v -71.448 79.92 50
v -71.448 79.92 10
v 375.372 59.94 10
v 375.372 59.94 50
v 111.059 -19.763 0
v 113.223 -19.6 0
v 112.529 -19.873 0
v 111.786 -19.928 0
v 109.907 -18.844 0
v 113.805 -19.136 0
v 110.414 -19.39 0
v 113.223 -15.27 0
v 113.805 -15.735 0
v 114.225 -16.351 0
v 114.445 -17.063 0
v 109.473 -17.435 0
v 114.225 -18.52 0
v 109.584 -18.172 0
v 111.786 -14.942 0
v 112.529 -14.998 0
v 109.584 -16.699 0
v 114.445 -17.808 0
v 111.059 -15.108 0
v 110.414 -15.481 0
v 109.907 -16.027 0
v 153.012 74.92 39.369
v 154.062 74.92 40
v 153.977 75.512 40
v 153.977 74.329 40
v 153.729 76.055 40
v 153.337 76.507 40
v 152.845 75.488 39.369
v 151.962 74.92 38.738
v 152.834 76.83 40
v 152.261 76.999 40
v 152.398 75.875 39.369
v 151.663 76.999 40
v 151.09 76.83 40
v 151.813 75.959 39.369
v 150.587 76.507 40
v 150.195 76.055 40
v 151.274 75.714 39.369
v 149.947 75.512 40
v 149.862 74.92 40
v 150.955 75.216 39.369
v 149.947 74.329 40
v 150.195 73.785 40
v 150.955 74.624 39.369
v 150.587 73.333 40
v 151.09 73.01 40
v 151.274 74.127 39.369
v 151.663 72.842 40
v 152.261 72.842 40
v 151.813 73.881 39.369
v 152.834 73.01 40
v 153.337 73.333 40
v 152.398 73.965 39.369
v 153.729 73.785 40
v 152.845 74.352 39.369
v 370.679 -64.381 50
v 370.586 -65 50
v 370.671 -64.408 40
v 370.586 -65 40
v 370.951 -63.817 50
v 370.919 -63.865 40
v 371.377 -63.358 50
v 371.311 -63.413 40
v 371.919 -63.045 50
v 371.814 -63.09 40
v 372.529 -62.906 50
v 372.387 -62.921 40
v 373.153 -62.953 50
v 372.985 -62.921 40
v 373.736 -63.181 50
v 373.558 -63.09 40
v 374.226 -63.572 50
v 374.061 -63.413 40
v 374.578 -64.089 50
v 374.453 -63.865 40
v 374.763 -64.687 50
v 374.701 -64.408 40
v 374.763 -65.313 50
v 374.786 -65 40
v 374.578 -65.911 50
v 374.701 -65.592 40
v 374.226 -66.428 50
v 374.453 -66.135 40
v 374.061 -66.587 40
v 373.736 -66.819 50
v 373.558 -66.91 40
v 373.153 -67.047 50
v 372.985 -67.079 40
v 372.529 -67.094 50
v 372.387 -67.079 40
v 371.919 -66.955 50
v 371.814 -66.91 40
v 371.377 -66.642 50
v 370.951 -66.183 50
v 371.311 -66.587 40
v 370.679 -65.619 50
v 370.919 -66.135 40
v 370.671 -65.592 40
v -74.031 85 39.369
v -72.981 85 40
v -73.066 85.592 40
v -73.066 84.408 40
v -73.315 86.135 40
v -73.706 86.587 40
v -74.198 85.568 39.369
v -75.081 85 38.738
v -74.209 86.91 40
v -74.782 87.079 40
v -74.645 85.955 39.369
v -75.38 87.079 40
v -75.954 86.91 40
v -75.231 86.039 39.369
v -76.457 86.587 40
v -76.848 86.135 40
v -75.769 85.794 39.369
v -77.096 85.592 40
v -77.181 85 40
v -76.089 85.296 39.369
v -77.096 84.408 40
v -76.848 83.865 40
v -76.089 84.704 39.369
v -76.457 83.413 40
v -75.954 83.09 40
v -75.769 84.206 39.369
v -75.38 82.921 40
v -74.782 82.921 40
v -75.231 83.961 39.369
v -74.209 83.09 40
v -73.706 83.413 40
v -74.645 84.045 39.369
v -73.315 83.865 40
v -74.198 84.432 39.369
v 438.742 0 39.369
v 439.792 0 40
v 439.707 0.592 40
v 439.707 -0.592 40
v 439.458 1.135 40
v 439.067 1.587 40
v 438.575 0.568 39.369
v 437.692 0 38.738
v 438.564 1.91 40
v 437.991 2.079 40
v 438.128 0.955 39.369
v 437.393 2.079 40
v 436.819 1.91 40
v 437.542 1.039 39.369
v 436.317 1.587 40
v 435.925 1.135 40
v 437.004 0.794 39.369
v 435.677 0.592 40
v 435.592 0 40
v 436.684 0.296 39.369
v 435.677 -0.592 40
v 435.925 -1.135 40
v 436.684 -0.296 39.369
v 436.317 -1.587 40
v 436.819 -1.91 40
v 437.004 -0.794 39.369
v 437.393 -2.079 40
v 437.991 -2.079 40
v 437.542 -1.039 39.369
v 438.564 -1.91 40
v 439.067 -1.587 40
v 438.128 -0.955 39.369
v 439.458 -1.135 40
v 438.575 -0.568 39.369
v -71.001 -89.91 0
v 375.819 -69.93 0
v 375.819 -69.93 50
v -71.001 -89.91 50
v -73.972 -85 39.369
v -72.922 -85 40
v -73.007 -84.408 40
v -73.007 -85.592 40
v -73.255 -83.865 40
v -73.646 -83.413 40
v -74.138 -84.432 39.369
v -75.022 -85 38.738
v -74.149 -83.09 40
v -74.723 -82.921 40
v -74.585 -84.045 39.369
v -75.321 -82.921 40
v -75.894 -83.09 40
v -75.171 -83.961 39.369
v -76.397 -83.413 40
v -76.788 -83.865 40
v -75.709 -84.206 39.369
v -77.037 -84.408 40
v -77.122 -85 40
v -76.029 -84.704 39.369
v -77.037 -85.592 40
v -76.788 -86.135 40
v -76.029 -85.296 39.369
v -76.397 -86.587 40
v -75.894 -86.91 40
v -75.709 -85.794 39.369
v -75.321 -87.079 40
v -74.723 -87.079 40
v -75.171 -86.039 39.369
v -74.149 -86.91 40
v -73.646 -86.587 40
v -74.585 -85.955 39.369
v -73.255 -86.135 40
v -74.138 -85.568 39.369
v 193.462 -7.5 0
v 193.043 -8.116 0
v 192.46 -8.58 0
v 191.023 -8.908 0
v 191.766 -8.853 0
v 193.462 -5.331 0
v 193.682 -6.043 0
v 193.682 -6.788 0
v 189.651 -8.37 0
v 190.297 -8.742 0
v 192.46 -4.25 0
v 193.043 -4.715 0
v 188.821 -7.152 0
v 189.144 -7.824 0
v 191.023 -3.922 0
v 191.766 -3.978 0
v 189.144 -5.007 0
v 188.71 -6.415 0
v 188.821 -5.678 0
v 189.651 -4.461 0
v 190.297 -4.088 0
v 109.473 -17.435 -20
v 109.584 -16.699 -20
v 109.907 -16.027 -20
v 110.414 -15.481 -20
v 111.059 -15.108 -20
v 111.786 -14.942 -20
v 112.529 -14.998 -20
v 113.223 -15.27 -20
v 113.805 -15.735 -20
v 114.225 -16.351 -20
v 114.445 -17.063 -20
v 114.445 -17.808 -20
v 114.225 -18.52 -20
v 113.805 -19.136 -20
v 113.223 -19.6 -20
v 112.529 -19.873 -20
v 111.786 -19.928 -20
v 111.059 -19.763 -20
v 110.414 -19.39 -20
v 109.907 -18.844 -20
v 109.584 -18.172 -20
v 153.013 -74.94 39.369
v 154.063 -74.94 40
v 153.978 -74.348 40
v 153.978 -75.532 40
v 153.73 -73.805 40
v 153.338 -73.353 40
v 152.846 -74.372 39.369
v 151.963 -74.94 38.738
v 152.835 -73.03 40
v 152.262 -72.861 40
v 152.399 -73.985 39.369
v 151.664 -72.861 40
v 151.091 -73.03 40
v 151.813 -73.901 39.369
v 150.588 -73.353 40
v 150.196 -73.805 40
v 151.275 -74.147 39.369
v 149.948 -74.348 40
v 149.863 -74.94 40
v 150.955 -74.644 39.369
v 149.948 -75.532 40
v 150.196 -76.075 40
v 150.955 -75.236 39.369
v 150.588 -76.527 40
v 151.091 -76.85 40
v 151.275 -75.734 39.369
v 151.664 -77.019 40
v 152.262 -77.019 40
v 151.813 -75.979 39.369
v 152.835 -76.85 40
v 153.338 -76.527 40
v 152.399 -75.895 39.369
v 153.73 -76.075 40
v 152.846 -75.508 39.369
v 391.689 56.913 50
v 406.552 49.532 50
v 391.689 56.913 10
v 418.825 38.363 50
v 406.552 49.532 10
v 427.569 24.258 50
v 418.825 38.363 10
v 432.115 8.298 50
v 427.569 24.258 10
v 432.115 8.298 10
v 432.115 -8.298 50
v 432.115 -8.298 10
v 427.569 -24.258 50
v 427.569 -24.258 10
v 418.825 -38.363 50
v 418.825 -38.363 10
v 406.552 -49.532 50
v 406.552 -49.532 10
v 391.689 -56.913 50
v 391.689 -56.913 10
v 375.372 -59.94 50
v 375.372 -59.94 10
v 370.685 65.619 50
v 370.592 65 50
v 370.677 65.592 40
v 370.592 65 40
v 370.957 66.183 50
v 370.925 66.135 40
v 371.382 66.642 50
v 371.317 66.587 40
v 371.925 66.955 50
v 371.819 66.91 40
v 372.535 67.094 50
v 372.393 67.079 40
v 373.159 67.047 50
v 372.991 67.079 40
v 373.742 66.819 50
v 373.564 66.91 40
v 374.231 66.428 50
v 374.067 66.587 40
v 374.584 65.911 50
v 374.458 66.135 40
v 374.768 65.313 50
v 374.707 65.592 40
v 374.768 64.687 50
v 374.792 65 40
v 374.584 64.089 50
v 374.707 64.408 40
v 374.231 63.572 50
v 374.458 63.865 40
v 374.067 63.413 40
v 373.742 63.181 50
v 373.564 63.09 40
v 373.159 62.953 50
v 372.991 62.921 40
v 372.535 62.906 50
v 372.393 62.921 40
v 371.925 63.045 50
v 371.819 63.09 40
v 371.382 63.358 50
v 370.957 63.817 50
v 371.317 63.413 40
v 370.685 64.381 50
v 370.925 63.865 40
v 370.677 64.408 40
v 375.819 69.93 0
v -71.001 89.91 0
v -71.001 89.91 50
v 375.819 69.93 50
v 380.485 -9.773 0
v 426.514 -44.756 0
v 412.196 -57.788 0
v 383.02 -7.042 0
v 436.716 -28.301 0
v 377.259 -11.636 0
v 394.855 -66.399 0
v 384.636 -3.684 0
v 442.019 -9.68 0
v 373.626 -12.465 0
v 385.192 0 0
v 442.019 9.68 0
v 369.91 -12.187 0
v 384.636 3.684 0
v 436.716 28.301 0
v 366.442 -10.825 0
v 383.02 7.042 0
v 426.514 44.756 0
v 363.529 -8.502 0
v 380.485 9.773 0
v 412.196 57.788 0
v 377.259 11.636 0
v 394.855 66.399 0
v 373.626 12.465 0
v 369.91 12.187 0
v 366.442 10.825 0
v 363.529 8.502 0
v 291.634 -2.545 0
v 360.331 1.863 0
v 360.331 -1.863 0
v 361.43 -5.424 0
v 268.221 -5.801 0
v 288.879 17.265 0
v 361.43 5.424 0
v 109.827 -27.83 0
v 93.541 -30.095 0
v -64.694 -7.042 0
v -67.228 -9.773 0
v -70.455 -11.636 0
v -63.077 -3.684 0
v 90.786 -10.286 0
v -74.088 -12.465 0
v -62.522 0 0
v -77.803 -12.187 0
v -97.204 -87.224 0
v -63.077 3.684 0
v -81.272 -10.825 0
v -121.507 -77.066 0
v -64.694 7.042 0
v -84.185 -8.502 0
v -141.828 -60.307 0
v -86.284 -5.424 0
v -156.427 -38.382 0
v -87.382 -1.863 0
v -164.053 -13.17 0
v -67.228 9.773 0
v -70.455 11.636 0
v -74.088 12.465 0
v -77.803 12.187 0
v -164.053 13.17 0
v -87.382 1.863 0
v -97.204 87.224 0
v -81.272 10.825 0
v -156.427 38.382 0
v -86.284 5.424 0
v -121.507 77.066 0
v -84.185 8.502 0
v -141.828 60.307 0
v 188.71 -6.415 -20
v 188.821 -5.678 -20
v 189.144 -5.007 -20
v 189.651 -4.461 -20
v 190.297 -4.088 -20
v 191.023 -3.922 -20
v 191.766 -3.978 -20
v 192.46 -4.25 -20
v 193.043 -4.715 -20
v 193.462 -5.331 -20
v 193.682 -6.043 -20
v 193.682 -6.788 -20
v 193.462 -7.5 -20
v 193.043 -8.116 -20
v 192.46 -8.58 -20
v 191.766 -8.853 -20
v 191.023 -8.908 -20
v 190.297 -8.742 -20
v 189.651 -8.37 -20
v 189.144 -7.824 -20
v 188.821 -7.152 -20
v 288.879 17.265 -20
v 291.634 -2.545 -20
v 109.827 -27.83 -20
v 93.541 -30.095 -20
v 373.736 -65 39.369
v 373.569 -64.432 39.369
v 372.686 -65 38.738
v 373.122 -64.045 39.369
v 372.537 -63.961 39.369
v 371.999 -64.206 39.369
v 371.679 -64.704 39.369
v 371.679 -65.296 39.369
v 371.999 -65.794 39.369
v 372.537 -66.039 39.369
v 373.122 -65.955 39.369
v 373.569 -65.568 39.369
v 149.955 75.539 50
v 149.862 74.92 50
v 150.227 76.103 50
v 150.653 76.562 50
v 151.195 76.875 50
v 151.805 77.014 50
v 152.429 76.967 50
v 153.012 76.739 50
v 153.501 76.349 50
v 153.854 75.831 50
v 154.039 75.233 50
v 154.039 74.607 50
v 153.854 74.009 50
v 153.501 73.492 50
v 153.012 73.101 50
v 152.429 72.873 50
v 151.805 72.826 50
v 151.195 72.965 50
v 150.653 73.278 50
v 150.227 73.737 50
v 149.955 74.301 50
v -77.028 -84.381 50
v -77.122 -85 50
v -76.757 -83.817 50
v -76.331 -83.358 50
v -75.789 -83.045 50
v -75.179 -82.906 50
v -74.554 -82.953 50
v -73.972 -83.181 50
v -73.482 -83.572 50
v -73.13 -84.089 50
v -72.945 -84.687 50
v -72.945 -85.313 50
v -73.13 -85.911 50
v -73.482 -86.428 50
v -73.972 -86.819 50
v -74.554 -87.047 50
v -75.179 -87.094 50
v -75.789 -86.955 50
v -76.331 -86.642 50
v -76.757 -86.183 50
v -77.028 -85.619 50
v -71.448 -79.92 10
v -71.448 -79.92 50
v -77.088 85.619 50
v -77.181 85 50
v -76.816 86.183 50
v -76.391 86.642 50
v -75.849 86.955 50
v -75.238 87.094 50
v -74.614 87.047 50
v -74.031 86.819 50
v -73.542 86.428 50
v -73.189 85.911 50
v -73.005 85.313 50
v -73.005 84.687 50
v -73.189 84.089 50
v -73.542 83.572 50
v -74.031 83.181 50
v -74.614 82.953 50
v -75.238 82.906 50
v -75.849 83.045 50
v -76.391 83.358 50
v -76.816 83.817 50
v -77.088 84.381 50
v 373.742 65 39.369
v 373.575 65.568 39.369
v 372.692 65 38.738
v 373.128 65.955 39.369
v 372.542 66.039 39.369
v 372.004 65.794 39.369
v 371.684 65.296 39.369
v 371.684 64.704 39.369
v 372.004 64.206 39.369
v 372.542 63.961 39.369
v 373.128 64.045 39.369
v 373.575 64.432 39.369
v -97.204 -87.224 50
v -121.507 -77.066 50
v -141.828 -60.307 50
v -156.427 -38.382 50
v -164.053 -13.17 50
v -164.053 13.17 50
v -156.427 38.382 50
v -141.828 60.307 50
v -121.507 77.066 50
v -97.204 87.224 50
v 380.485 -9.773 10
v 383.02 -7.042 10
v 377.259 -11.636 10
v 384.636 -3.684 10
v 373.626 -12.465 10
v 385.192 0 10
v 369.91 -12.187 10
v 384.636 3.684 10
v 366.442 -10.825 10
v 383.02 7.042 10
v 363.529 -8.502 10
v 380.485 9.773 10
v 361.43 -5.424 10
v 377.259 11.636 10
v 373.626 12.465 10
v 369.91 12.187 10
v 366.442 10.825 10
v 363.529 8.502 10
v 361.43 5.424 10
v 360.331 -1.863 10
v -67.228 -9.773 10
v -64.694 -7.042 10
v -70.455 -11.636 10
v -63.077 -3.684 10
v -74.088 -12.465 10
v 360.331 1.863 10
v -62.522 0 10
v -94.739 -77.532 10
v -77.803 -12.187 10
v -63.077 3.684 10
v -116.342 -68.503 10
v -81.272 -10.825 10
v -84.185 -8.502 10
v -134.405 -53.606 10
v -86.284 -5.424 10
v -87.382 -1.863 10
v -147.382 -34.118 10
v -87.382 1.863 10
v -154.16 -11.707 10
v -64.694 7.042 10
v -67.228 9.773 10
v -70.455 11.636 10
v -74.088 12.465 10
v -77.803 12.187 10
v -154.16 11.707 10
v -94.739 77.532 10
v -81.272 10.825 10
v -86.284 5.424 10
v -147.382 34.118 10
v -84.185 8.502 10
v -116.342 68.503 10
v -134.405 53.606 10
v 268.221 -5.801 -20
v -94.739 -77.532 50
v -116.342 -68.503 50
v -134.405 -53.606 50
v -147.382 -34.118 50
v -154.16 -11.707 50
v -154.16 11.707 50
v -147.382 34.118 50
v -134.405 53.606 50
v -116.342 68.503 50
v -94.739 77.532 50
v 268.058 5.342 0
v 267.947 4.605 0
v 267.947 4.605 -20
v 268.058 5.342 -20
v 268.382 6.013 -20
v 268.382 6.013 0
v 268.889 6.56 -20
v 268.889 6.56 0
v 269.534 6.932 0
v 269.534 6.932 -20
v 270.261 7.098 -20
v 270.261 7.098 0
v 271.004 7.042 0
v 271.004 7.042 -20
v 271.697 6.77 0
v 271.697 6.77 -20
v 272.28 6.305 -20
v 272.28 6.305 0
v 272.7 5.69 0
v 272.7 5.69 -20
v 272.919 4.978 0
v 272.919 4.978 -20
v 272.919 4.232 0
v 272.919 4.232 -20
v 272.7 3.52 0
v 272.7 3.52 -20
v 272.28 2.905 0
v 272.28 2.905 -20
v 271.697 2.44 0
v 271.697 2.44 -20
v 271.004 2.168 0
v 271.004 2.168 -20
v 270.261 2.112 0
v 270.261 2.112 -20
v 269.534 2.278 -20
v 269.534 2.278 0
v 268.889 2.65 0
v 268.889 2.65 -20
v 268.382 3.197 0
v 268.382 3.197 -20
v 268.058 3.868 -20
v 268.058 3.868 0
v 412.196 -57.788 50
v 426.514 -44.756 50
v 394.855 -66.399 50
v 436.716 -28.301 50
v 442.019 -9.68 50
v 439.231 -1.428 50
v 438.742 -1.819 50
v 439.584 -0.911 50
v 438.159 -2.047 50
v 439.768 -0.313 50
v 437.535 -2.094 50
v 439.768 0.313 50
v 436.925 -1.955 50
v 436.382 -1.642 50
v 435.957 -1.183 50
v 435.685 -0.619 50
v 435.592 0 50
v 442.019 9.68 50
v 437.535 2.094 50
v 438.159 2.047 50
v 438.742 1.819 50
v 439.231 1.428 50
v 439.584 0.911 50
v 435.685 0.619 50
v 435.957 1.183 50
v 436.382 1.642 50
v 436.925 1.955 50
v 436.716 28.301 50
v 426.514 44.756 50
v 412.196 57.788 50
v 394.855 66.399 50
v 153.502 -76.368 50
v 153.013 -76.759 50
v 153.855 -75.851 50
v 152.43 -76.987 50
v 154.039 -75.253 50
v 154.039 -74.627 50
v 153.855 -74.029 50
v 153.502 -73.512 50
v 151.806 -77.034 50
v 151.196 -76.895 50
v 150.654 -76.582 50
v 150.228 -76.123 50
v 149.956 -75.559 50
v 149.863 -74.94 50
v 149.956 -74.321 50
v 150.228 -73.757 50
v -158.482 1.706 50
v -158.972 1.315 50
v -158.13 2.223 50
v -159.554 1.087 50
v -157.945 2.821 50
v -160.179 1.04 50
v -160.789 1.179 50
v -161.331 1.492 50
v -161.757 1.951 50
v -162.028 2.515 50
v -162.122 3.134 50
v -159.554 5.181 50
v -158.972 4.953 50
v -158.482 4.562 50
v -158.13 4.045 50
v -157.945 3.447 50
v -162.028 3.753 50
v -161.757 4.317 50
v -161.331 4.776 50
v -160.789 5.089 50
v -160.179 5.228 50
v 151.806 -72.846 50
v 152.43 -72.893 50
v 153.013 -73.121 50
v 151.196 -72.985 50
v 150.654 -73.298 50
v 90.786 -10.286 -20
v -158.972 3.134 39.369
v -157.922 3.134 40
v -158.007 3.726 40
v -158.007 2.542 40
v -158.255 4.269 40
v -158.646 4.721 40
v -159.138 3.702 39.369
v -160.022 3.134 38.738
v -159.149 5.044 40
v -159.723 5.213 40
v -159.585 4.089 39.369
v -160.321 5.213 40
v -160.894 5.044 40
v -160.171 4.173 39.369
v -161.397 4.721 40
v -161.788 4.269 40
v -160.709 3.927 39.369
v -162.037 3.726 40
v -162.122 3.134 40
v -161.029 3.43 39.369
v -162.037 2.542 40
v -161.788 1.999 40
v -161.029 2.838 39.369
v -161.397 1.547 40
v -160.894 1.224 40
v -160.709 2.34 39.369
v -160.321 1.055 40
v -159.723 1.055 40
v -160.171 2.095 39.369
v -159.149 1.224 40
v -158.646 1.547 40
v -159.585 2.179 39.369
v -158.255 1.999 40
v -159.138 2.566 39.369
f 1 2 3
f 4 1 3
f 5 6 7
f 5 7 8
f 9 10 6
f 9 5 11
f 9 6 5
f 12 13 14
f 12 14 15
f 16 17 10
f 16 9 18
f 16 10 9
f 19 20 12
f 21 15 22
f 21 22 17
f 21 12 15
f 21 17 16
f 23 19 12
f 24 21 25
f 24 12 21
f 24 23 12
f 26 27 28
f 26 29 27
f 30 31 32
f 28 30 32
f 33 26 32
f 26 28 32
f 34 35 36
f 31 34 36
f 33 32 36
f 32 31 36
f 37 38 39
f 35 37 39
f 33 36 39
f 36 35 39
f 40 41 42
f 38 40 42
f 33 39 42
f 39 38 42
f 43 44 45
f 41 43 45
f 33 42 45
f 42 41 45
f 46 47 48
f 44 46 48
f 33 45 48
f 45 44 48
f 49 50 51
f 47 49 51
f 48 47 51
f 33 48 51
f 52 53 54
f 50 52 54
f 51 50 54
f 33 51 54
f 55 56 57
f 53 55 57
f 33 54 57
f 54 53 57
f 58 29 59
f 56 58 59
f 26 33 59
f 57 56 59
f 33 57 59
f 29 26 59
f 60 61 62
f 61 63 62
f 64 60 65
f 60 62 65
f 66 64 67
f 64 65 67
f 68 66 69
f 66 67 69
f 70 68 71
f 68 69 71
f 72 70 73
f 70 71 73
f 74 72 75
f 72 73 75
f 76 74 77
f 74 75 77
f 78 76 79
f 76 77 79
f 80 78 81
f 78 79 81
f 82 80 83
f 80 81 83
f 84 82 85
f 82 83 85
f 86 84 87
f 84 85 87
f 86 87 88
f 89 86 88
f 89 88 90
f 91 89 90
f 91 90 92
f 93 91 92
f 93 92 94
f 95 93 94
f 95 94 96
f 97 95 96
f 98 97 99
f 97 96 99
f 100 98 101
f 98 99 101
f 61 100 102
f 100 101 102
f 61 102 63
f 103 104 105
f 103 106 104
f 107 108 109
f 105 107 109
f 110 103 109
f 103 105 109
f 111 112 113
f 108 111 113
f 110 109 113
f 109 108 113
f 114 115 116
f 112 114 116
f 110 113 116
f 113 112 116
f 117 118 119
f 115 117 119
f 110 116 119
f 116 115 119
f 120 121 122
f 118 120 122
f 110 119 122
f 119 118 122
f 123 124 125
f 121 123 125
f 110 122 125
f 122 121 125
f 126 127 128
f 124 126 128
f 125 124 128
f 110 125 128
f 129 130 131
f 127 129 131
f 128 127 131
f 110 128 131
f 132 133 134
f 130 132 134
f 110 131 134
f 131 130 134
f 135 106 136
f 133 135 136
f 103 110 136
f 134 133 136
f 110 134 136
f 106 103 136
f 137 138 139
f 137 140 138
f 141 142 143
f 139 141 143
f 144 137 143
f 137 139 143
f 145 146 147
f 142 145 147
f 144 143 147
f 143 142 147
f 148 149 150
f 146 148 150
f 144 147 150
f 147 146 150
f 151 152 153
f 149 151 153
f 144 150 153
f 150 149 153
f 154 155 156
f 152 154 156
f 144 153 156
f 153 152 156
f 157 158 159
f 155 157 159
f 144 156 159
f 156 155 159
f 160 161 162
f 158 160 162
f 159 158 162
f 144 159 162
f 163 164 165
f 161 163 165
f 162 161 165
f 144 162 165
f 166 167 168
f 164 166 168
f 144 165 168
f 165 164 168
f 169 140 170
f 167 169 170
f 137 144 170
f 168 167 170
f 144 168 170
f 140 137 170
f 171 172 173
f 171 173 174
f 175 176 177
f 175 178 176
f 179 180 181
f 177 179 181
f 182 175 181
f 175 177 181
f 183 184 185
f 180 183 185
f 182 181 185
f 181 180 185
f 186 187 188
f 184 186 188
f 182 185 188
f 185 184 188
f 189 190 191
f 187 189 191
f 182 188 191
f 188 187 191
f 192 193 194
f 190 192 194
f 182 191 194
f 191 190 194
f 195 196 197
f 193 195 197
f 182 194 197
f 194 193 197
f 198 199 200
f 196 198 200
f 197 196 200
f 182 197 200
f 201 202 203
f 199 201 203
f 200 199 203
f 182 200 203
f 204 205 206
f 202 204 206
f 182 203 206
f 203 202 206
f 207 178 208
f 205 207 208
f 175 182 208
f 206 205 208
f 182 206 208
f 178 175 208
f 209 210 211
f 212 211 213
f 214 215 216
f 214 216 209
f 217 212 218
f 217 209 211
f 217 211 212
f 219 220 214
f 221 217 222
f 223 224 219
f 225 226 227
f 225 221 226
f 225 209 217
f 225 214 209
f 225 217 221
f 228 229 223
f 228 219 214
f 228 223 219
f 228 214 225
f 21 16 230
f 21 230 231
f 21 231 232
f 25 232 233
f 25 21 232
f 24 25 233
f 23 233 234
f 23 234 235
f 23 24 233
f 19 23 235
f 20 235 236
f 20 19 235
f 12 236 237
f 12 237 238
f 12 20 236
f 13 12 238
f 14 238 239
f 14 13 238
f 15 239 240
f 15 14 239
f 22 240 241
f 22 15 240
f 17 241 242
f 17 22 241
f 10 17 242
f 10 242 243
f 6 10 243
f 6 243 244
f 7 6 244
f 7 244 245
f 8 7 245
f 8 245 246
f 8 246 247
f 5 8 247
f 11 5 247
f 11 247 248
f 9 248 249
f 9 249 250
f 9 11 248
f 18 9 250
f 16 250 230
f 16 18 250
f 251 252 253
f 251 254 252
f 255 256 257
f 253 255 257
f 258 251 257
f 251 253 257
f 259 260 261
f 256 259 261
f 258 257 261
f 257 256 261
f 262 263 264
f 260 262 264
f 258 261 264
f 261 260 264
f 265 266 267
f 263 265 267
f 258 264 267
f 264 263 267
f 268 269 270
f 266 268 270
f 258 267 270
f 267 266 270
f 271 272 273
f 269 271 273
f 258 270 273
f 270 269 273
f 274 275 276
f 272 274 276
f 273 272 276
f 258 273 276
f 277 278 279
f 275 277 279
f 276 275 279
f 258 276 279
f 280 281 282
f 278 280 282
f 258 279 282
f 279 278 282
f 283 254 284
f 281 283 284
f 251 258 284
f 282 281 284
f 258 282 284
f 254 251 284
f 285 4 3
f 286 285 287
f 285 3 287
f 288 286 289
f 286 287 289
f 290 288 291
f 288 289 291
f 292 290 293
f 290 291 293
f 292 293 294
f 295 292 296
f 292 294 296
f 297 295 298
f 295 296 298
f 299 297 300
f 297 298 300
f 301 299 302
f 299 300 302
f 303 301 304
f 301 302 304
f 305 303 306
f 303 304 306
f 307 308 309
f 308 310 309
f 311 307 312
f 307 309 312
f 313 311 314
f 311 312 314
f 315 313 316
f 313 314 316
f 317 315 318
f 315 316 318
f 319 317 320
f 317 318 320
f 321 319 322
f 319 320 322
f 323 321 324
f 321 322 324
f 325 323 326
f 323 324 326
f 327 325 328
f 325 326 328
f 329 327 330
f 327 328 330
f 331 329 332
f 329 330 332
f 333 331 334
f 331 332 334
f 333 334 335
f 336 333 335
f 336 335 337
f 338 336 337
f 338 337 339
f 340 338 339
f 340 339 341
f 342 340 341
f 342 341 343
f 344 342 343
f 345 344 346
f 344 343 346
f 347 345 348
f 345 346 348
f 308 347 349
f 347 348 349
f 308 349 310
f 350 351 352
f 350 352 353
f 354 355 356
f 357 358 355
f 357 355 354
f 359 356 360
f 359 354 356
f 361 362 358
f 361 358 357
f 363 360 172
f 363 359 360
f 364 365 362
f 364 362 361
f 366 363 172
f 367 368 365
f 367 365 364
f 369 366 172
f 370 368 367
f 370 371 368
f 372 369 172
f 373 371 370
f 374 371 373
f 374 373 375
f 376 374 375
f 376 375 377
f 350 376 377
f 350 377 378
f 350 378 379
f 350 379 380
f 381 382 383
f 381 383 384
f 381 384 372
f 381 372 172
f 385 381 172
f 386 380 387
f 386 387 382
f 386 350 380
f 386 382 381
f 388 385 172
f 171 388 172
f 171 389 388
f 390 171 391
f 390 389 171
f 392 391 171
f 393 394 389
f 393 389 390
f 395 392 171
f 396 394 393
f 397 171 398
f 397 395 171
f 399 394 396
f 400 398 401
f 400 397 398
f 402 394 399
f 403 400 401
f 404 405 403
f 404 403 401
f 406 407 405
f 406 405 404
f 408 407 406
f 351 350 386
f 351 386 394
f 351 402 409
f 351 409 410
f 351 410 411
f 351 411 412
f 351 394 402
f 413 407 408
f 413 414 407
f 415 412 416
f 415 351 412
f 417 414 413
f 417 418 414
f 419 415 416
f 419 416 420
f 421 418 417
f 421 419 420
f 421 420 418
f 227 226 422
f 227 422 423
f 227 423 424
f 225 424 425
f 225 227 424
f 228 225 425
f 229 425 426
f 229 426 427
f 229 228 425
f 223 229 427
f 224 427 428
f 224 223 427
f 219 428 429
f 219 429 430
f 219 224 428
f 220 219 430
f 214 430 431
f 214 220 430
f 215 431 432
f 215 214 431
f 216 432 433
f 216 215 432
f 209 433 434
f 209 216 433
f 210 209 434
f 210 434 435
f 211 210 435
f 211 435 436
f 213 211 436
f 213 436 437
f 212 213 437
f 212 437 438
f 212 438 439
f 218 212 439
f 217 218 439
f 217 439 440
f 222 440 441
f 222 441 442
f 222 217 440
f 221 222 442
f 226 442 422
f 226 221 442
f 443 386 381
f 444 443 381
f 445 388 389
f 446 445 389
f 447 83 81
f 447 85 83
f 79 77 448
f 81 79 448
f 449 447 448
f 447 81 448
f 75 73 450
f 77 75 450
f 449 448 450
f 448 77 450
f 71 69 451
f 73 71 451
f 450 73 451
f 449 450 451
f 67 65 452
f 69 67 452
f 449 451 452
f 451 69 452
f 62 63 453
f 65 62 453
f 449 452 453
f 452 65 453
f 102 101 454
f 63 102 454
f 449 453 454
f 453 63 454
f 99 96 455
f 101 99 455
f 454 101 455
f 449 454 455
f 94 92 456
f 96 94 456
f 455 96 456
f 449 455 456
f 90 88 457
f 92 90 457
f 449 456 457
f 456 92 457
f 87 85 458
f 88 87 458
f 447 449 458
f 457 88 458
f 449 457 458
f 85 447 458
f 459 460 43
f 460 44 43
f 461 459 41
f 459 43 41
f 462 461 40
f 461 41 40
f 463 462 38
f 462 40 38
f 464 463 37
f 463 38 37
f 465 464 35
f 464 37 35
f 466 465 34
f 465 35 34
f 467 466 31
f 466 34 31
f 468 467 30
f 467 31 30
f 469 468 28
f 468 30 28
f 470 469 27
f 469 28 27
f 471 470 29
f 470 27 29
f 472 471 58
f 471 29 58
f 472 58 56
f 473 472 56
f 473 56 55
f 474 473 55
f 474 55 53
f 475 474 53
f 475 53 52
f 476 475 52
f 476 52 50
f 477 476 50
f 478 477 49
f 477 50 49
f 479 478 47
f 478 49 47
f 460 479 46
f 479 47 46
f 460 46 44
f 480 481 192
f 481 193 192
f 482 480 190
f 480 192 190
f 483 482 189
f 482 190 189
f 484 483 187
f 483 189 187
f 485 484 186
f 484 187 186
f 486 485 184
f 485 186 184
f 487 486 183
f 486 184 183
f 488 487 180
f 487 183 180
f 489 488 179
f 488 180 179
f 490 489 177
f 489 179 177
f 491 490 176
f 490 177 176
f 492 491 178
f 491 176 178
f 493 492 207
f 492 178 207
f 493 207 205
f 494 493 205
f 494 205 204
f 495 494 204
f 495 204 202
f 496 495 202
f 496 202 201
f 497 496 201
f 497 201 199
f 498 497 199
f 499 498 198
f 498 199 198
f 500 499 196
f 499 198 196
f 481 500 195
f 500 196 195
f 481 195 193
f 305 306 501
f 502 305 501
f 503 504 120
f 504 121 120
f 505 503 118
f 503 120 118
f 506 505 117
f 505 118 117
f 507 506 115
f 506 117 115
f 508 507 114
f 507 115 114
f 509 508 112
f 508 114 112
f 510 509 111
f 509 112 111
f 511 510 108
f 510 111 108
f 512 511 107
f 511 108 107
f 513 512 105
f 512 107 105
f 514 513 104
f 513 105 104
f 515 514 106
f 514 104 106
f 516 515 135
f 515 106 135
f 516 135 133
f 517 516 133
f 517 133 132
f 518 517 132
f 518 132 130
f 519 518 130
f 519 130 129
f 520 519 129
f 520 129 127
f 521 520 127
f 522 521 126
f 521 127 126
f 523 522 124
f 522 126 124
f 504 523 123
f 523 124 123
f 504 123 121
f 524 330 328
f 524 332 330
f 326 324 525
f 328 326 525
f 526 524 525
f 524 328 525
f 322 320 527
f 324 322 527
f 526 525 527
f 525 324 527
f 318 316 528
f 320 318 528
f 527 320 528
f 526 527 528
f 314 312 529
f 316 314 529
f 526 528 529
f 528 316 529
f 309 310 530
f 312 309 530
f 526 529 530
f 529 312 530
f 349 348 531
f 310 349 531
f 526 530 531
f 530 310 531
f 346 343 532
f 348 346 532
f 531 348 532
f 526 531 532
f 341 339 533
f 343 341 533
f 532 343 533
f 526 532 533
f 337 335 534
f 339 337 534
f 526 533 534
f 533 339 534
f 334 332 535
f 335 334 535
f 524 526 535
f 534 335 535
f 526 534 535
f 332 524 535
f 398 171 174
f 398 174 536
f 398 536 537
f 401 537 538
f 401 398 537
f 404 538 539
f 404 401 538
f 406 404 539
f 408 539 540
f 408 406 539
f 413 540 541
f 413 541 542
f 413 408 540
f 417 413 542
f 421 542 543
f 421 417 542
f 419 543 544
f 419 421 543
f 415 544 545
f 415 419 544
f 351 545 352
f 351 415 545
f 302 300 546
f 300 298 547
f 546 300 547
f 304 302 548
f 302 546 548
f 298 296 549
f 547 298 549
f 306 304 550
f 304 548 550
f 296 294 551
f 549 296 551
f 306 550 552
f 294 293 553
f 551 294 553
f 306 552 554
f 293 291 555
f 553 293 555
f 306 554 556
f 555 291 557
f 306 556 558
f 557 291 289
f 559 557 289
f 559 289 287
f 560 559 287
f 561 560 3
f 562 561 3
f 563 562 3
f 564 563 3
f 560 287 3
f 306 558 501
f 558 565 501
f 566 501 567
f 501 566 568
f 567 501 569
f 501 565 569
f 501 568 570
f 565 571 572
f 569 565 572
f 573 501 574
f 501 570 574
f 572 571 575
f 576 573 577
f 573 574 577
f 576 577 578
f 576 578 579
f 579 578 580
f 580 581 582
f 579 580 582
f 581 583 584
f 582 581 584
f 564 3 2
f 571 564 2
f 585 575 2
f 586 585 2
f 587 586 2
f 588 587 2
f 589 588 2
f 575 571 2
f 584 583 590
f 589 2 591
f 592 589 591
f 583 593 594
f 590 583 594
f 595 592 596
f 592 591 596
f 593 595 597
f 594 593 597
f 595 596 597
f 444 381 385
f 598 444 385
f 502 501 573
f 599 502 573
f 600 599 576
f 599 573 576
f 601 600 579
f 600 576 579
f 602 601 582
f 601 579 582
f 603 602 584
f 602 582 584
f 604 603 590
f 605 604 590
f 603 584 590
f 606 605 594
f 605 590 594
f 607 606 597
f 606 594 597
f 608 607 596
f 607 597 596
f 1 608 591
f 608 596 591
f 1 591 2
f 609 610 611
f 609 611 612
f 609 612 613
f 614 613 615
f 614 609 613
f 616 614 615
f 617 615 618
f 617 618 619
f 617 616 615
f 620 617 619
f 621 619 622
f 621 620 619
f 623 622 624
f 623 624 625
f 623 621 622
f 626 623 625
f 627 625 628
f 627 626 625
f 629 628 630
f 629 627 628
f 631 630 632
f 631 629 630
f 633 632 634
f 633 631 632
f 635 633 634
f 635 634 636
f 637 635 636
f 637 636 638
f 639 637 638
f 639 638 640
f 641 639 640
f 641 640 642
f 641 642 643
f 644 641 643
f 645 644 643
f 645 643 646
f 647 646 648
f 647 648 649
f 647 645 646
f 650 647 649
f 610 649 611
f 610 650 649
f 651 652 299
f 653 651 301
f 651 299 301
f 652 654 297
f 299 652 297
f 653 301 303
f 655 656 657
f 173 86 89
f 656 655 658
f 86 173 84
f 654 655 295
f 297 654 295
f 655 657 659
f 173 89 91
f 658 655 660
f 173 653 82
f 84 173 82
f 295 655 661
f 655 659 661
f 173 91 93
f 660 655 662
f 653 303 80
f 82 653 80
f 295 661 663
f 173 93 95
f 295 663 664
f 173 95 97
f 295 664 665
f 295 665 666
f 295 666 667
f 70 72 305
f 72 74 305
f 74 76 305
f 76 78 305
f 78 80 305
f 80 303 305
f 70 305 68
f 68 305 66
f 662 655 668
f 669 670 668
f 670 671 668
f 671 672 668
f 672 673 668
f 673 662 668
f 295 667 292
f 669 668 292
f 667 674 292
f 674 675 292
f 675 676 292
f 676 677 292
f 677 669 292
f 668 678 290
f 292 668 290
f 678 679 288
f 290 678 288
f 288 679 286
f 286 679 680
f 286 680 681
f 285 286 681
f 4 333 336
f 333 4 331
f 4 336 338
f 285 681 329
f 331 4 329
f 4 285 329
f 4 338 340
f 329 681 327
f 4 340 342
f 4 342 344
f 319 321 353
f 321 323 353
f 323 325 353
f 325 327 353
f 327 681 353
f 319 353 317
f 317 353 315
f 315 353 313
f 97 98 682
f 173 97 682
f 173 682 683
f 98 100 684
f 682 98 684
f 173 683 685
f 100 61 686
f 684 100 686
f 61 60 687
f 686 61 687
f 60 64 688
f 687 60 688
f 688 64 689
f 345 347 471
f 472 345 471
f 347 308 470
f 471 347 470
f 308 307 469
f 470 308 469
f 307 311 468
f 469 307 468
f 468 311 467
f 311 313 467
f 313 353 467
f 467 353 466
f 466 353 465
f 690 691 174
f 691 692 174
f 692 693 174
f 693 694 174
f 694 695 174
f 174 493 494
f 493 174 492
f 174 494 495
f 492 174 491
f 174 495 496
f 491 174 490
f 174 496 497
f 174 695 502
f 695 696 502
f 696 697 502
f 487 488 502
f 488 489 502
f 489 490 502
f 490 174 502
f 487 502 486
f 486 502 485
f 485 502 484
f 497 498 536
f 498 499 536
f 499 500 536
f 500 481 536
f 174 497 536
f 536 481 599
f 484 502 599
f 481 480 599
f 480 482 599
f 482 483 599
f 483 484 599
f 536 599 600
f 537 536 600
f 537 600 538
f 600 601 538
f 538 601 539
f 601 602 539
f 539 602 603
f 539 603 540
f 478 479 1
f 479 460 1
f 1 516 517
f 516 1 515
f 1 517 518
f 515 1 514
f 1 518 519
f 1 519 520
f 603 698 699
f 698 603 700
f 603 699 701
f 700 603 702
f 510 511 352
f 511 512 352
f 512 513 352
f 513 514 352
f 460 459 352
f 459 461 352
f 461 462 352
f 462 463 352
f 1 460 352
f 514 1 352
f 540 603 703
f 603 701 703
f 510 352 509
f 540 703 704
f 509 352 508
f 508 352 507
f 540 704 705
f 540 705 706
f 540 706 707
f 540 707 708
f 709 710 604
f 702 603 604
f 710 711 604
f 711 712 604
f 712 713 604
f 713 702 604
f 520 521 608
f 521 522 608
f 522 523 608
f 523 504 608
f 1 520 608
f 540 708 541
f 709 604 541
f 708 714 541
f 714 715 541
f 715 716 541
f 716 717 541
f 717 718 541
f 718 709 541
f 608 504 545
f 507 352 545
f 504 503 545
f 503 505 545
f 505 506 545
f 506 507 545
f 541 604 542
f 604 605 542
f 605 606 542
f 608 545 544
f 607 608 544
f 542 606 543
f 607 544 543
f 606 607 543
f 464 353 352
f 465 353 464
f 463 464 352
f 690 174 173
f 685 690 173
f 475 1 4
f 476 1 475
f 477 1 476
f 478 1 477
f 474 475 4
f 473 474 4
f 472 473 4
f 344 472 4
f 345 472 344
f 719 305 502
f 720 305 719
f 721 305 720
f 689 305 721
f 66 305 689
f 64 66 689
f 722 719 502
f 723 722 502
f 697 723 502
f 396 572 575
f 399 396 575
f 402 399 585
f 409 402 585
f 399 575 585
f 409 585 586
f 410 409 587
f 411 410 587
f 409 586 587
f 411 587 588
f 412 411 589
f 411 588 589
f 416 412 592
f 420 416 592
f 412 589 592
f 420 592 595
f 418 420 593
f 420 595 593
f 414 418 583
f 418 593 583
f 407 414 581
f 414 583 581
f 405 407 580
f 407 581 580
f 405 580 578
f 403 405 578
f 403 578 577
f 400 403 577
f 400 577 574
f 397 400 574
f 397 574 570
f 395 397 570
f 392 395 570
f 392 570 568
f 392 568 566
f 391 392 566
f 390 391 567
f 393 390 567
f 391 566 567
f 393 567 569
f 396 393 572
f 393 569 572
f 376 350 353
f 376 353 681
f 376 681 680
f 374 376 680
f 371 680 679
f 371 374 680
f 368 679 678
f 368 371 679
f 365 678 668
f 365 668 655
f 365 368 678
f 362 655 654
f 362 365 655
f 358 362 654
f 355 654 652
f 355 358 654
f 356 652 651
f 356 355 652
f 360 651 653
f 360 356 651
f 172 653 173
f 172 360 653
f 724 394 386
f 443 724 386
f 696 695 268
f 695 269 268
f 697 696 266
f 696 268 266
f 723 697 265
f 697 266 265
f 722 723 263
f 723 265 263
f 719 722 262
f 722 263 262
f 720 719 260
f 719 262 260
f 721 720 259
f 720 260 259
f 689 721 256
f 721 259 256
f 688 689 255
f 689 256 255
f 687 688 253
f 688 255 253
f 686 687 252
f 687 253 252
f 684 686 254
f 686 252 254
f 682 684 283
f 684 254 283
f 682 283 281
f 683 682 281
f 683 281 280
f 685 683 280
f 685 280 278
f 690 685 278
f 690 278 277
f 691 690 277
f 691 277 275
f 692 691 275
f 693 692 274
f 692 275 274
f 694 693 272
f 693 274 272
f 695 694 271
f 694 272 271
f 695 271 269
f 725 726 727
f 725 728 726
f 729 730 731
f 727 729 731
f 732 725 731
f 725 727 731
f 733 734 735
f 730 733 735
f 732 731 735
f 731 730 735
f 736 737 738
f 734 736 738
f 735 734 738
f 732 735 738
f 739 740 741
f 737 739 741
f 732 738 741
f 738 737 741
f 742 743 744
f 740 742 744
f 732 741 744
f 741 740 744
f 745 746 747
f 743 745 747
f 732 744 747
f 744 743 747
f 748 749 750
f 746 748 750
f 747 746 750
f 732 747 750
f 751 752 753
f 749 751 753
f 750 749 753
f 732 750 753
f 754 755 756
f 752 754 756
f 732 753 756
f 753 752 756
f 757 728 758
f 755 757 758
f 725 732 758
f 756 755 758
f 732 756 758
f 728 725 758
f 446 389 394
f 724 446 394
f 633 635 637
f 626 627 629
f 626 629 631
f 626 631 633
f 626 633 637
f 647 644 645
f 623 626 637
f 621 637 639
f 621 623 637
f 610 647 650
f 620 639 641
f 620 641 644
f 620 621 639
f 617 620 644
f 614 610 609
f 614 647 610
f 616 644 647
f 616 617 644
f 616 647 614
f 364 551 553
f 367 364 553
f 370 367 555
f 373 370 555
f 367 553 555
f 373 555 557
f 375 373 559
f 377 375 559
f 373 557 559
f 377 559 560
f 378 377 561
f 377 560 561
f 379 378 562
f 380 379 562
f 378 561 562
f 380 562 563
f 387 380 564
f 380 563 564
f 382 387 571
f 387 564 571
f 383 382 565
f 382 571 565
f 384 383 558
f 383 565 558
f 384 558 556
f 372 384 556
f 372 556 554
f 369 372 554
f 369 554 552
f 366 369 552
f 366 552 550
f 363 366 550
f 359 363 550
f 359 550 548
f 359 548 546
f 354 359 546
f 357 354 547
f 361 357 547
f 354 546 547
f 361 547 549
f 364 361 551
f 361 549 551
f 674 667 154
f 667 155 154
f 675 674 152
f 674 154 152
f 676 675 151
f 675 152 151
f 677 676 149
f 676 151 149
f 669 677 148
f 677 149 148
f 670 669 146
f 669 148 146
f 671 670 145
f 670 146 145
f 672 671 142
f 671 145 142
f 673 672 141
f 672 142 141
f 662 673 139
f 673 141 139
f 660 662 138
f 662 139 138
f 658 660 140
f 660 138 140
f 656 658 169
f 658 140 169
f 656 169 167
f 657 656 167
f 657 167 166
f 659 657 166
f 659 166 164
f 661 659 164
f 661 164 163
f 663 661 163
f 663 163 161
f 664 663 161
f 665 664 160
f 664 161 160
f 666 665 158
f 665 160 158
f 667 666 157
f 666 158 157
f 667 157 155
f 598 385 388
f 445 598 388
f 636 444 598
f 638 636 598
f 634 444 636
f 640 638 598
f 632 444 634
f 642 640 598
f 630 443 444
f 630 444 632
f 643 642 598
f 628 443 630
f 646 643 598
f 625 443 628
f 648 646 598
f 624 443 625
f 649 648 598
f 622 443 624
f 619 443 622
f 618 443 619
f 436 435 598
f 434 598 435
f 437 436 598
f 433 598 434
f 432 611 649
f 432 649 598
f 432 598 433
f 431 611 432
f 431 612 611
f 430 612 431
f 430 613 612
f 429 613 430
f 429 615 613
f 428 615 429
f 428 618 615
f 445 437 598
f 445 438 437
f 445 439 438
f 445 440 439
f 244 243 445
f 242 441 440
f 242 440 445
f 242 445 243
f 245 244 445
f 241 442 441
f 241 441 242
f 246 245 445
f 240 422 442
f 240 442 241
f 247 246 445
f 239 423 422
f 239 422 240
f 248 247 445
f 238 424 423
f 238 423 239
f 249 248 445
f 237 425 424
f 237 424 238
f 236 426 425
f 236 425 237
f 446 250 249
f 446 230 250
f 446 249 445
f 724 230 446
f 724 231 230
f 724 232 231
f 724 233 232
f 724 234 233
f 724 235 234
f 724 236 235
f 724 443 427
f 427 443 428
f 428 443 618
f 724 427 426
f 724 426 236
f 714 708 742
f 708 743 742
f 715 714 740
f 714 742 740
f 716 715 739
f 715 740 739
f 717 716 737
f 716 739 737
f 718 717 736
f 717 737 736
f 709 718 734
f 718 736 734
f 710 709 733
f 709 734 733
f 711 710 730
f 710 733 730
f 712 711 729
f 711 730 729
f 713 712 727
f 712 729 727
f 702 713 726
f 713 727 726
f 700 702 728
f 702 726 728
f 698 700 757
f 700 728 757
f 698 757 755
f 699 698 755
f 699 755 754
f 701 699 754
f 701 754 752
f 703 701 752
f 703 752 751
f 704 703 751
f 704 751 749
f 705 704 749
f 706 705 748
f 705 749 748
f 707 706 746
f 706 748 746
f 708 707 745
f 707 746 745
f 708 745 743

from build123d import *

# Parameters (mm, degrees)
BOSS_EXTRUDE2_DEPTH   = 50
SHELL2_T              = -10
SKETCH2_R             = 12.5
CUT_EXTRUDE1_DEPTH    = 10
M5_TAPPED_HOLE1_D     = 4.2
M5_TAPPED_HOLE1_DEPTH = 10
M5_TAPPED_HOLE1_TIP   = 1.2618073
SKETCH7_R             = 2.5
BOSS_EXTRUDE3_DEPTH   = 20


with BuildPart() as part:
    # Sketch1 → Boss-Extrude2 (new body)
    with BuildSketch(Plane.XY):
        with BuildLine():
            Line((-71.001256012, 89.910155998), (375.818743988, 69.930121332))
            ThreePointArc((375.818743988, 69.930121332), (442.691743746, 0), (375.818743988, -69.930121332))
            Line((375.818743988, -69.930121332), (-71.001256012, -89.910155998))
            ThreePointArc((-71.001256012, -89.910155998), (-165.021684895, 0), (-71.001256012, 89.910155998))
        make_face()
    extrude(amount=BOSS_EXTRUDE2_DEPTH)

    # Shell2
    shell2_openings = [part.faces().sort_by_distance(p)[0] for p in [
        (145.621886707, 0, 50),
    ]]
    offset(amount=SHELL2_T, openings=shell2_openings, kind=Kind.INTERSECTION)

    # Sketch2 → Cut-Extrude1 (cut)
    with BuildSketch(Plane.XY.offset(10)):
        with Locations((-75.021684895, 0)):
            Circle(SKETCH2_R)
        with Locations((372.691743746, 0)):
            Circle(SKETCH2_R)
    extrude(amount=-CUT_EXTRUDE1_DEPTH, mode=Mode.SUBTRACT)

    # M5 Tapped Hole1
    with Locations(Plane.XY.offset(50)):
        with Locations((-160.021684895, 3.133929532), (-75.081342532, 85), (-75.021684895, -85), (437.691743746, 0), (372.686127316, -64.999999757), (372.691743746, 65), (151.962029668, 74.920138665), (151.962918886, -74.94005433)):
            Hole(M5_TAPPED_HOLE1_D / 2, depth=M5_TAPPED_HOLE1_DEPTH)
            with Locations((0, 0, -(M5_TAPPED_HOLE1_DEPTH + M5_TAPPED_HOLE1_TIP / 2))):  # 118° drill point
                Cone(0, M5_TAPPED_HOLE1_D / 2, M5_TAPPED_HOLE1_TIP, mode=Mode.SUBTRACT)

    # Sketch7 → Boss-Extrude3 (add)
    with BuildSketch(Plane(origin=(0, 0, 0), x_dir=(-1, 0, 0), z_dir=(0, 0, -1))):
        Polygon((-268.221462492, -5.800860149), (-109.826947867, -27.830102859), (-93.540881228, -30.095141618), (-90.785832397, -10.285807809), (-288.879170482, 17.264680503), (-291.634219314, -2.544653305), align=None)
        with Locations((-270.447361089, 4.604964768)):
            Circle(SKETCH7_R, mode=Mode.SUBTRACT)
        with Locations((-191.210025855, -6.415230557)):
            Circle(SKETCH7_R, mode=Mode.SUBTRACT)
        with Locations((-111.972690621, -17.435425882)):
            Circle(SKETCH7_R, mode=Mode.SUBTRACT)
    extrude(amount=BOSS_EXTRUDE3_DEPTH)


solid = part.part
